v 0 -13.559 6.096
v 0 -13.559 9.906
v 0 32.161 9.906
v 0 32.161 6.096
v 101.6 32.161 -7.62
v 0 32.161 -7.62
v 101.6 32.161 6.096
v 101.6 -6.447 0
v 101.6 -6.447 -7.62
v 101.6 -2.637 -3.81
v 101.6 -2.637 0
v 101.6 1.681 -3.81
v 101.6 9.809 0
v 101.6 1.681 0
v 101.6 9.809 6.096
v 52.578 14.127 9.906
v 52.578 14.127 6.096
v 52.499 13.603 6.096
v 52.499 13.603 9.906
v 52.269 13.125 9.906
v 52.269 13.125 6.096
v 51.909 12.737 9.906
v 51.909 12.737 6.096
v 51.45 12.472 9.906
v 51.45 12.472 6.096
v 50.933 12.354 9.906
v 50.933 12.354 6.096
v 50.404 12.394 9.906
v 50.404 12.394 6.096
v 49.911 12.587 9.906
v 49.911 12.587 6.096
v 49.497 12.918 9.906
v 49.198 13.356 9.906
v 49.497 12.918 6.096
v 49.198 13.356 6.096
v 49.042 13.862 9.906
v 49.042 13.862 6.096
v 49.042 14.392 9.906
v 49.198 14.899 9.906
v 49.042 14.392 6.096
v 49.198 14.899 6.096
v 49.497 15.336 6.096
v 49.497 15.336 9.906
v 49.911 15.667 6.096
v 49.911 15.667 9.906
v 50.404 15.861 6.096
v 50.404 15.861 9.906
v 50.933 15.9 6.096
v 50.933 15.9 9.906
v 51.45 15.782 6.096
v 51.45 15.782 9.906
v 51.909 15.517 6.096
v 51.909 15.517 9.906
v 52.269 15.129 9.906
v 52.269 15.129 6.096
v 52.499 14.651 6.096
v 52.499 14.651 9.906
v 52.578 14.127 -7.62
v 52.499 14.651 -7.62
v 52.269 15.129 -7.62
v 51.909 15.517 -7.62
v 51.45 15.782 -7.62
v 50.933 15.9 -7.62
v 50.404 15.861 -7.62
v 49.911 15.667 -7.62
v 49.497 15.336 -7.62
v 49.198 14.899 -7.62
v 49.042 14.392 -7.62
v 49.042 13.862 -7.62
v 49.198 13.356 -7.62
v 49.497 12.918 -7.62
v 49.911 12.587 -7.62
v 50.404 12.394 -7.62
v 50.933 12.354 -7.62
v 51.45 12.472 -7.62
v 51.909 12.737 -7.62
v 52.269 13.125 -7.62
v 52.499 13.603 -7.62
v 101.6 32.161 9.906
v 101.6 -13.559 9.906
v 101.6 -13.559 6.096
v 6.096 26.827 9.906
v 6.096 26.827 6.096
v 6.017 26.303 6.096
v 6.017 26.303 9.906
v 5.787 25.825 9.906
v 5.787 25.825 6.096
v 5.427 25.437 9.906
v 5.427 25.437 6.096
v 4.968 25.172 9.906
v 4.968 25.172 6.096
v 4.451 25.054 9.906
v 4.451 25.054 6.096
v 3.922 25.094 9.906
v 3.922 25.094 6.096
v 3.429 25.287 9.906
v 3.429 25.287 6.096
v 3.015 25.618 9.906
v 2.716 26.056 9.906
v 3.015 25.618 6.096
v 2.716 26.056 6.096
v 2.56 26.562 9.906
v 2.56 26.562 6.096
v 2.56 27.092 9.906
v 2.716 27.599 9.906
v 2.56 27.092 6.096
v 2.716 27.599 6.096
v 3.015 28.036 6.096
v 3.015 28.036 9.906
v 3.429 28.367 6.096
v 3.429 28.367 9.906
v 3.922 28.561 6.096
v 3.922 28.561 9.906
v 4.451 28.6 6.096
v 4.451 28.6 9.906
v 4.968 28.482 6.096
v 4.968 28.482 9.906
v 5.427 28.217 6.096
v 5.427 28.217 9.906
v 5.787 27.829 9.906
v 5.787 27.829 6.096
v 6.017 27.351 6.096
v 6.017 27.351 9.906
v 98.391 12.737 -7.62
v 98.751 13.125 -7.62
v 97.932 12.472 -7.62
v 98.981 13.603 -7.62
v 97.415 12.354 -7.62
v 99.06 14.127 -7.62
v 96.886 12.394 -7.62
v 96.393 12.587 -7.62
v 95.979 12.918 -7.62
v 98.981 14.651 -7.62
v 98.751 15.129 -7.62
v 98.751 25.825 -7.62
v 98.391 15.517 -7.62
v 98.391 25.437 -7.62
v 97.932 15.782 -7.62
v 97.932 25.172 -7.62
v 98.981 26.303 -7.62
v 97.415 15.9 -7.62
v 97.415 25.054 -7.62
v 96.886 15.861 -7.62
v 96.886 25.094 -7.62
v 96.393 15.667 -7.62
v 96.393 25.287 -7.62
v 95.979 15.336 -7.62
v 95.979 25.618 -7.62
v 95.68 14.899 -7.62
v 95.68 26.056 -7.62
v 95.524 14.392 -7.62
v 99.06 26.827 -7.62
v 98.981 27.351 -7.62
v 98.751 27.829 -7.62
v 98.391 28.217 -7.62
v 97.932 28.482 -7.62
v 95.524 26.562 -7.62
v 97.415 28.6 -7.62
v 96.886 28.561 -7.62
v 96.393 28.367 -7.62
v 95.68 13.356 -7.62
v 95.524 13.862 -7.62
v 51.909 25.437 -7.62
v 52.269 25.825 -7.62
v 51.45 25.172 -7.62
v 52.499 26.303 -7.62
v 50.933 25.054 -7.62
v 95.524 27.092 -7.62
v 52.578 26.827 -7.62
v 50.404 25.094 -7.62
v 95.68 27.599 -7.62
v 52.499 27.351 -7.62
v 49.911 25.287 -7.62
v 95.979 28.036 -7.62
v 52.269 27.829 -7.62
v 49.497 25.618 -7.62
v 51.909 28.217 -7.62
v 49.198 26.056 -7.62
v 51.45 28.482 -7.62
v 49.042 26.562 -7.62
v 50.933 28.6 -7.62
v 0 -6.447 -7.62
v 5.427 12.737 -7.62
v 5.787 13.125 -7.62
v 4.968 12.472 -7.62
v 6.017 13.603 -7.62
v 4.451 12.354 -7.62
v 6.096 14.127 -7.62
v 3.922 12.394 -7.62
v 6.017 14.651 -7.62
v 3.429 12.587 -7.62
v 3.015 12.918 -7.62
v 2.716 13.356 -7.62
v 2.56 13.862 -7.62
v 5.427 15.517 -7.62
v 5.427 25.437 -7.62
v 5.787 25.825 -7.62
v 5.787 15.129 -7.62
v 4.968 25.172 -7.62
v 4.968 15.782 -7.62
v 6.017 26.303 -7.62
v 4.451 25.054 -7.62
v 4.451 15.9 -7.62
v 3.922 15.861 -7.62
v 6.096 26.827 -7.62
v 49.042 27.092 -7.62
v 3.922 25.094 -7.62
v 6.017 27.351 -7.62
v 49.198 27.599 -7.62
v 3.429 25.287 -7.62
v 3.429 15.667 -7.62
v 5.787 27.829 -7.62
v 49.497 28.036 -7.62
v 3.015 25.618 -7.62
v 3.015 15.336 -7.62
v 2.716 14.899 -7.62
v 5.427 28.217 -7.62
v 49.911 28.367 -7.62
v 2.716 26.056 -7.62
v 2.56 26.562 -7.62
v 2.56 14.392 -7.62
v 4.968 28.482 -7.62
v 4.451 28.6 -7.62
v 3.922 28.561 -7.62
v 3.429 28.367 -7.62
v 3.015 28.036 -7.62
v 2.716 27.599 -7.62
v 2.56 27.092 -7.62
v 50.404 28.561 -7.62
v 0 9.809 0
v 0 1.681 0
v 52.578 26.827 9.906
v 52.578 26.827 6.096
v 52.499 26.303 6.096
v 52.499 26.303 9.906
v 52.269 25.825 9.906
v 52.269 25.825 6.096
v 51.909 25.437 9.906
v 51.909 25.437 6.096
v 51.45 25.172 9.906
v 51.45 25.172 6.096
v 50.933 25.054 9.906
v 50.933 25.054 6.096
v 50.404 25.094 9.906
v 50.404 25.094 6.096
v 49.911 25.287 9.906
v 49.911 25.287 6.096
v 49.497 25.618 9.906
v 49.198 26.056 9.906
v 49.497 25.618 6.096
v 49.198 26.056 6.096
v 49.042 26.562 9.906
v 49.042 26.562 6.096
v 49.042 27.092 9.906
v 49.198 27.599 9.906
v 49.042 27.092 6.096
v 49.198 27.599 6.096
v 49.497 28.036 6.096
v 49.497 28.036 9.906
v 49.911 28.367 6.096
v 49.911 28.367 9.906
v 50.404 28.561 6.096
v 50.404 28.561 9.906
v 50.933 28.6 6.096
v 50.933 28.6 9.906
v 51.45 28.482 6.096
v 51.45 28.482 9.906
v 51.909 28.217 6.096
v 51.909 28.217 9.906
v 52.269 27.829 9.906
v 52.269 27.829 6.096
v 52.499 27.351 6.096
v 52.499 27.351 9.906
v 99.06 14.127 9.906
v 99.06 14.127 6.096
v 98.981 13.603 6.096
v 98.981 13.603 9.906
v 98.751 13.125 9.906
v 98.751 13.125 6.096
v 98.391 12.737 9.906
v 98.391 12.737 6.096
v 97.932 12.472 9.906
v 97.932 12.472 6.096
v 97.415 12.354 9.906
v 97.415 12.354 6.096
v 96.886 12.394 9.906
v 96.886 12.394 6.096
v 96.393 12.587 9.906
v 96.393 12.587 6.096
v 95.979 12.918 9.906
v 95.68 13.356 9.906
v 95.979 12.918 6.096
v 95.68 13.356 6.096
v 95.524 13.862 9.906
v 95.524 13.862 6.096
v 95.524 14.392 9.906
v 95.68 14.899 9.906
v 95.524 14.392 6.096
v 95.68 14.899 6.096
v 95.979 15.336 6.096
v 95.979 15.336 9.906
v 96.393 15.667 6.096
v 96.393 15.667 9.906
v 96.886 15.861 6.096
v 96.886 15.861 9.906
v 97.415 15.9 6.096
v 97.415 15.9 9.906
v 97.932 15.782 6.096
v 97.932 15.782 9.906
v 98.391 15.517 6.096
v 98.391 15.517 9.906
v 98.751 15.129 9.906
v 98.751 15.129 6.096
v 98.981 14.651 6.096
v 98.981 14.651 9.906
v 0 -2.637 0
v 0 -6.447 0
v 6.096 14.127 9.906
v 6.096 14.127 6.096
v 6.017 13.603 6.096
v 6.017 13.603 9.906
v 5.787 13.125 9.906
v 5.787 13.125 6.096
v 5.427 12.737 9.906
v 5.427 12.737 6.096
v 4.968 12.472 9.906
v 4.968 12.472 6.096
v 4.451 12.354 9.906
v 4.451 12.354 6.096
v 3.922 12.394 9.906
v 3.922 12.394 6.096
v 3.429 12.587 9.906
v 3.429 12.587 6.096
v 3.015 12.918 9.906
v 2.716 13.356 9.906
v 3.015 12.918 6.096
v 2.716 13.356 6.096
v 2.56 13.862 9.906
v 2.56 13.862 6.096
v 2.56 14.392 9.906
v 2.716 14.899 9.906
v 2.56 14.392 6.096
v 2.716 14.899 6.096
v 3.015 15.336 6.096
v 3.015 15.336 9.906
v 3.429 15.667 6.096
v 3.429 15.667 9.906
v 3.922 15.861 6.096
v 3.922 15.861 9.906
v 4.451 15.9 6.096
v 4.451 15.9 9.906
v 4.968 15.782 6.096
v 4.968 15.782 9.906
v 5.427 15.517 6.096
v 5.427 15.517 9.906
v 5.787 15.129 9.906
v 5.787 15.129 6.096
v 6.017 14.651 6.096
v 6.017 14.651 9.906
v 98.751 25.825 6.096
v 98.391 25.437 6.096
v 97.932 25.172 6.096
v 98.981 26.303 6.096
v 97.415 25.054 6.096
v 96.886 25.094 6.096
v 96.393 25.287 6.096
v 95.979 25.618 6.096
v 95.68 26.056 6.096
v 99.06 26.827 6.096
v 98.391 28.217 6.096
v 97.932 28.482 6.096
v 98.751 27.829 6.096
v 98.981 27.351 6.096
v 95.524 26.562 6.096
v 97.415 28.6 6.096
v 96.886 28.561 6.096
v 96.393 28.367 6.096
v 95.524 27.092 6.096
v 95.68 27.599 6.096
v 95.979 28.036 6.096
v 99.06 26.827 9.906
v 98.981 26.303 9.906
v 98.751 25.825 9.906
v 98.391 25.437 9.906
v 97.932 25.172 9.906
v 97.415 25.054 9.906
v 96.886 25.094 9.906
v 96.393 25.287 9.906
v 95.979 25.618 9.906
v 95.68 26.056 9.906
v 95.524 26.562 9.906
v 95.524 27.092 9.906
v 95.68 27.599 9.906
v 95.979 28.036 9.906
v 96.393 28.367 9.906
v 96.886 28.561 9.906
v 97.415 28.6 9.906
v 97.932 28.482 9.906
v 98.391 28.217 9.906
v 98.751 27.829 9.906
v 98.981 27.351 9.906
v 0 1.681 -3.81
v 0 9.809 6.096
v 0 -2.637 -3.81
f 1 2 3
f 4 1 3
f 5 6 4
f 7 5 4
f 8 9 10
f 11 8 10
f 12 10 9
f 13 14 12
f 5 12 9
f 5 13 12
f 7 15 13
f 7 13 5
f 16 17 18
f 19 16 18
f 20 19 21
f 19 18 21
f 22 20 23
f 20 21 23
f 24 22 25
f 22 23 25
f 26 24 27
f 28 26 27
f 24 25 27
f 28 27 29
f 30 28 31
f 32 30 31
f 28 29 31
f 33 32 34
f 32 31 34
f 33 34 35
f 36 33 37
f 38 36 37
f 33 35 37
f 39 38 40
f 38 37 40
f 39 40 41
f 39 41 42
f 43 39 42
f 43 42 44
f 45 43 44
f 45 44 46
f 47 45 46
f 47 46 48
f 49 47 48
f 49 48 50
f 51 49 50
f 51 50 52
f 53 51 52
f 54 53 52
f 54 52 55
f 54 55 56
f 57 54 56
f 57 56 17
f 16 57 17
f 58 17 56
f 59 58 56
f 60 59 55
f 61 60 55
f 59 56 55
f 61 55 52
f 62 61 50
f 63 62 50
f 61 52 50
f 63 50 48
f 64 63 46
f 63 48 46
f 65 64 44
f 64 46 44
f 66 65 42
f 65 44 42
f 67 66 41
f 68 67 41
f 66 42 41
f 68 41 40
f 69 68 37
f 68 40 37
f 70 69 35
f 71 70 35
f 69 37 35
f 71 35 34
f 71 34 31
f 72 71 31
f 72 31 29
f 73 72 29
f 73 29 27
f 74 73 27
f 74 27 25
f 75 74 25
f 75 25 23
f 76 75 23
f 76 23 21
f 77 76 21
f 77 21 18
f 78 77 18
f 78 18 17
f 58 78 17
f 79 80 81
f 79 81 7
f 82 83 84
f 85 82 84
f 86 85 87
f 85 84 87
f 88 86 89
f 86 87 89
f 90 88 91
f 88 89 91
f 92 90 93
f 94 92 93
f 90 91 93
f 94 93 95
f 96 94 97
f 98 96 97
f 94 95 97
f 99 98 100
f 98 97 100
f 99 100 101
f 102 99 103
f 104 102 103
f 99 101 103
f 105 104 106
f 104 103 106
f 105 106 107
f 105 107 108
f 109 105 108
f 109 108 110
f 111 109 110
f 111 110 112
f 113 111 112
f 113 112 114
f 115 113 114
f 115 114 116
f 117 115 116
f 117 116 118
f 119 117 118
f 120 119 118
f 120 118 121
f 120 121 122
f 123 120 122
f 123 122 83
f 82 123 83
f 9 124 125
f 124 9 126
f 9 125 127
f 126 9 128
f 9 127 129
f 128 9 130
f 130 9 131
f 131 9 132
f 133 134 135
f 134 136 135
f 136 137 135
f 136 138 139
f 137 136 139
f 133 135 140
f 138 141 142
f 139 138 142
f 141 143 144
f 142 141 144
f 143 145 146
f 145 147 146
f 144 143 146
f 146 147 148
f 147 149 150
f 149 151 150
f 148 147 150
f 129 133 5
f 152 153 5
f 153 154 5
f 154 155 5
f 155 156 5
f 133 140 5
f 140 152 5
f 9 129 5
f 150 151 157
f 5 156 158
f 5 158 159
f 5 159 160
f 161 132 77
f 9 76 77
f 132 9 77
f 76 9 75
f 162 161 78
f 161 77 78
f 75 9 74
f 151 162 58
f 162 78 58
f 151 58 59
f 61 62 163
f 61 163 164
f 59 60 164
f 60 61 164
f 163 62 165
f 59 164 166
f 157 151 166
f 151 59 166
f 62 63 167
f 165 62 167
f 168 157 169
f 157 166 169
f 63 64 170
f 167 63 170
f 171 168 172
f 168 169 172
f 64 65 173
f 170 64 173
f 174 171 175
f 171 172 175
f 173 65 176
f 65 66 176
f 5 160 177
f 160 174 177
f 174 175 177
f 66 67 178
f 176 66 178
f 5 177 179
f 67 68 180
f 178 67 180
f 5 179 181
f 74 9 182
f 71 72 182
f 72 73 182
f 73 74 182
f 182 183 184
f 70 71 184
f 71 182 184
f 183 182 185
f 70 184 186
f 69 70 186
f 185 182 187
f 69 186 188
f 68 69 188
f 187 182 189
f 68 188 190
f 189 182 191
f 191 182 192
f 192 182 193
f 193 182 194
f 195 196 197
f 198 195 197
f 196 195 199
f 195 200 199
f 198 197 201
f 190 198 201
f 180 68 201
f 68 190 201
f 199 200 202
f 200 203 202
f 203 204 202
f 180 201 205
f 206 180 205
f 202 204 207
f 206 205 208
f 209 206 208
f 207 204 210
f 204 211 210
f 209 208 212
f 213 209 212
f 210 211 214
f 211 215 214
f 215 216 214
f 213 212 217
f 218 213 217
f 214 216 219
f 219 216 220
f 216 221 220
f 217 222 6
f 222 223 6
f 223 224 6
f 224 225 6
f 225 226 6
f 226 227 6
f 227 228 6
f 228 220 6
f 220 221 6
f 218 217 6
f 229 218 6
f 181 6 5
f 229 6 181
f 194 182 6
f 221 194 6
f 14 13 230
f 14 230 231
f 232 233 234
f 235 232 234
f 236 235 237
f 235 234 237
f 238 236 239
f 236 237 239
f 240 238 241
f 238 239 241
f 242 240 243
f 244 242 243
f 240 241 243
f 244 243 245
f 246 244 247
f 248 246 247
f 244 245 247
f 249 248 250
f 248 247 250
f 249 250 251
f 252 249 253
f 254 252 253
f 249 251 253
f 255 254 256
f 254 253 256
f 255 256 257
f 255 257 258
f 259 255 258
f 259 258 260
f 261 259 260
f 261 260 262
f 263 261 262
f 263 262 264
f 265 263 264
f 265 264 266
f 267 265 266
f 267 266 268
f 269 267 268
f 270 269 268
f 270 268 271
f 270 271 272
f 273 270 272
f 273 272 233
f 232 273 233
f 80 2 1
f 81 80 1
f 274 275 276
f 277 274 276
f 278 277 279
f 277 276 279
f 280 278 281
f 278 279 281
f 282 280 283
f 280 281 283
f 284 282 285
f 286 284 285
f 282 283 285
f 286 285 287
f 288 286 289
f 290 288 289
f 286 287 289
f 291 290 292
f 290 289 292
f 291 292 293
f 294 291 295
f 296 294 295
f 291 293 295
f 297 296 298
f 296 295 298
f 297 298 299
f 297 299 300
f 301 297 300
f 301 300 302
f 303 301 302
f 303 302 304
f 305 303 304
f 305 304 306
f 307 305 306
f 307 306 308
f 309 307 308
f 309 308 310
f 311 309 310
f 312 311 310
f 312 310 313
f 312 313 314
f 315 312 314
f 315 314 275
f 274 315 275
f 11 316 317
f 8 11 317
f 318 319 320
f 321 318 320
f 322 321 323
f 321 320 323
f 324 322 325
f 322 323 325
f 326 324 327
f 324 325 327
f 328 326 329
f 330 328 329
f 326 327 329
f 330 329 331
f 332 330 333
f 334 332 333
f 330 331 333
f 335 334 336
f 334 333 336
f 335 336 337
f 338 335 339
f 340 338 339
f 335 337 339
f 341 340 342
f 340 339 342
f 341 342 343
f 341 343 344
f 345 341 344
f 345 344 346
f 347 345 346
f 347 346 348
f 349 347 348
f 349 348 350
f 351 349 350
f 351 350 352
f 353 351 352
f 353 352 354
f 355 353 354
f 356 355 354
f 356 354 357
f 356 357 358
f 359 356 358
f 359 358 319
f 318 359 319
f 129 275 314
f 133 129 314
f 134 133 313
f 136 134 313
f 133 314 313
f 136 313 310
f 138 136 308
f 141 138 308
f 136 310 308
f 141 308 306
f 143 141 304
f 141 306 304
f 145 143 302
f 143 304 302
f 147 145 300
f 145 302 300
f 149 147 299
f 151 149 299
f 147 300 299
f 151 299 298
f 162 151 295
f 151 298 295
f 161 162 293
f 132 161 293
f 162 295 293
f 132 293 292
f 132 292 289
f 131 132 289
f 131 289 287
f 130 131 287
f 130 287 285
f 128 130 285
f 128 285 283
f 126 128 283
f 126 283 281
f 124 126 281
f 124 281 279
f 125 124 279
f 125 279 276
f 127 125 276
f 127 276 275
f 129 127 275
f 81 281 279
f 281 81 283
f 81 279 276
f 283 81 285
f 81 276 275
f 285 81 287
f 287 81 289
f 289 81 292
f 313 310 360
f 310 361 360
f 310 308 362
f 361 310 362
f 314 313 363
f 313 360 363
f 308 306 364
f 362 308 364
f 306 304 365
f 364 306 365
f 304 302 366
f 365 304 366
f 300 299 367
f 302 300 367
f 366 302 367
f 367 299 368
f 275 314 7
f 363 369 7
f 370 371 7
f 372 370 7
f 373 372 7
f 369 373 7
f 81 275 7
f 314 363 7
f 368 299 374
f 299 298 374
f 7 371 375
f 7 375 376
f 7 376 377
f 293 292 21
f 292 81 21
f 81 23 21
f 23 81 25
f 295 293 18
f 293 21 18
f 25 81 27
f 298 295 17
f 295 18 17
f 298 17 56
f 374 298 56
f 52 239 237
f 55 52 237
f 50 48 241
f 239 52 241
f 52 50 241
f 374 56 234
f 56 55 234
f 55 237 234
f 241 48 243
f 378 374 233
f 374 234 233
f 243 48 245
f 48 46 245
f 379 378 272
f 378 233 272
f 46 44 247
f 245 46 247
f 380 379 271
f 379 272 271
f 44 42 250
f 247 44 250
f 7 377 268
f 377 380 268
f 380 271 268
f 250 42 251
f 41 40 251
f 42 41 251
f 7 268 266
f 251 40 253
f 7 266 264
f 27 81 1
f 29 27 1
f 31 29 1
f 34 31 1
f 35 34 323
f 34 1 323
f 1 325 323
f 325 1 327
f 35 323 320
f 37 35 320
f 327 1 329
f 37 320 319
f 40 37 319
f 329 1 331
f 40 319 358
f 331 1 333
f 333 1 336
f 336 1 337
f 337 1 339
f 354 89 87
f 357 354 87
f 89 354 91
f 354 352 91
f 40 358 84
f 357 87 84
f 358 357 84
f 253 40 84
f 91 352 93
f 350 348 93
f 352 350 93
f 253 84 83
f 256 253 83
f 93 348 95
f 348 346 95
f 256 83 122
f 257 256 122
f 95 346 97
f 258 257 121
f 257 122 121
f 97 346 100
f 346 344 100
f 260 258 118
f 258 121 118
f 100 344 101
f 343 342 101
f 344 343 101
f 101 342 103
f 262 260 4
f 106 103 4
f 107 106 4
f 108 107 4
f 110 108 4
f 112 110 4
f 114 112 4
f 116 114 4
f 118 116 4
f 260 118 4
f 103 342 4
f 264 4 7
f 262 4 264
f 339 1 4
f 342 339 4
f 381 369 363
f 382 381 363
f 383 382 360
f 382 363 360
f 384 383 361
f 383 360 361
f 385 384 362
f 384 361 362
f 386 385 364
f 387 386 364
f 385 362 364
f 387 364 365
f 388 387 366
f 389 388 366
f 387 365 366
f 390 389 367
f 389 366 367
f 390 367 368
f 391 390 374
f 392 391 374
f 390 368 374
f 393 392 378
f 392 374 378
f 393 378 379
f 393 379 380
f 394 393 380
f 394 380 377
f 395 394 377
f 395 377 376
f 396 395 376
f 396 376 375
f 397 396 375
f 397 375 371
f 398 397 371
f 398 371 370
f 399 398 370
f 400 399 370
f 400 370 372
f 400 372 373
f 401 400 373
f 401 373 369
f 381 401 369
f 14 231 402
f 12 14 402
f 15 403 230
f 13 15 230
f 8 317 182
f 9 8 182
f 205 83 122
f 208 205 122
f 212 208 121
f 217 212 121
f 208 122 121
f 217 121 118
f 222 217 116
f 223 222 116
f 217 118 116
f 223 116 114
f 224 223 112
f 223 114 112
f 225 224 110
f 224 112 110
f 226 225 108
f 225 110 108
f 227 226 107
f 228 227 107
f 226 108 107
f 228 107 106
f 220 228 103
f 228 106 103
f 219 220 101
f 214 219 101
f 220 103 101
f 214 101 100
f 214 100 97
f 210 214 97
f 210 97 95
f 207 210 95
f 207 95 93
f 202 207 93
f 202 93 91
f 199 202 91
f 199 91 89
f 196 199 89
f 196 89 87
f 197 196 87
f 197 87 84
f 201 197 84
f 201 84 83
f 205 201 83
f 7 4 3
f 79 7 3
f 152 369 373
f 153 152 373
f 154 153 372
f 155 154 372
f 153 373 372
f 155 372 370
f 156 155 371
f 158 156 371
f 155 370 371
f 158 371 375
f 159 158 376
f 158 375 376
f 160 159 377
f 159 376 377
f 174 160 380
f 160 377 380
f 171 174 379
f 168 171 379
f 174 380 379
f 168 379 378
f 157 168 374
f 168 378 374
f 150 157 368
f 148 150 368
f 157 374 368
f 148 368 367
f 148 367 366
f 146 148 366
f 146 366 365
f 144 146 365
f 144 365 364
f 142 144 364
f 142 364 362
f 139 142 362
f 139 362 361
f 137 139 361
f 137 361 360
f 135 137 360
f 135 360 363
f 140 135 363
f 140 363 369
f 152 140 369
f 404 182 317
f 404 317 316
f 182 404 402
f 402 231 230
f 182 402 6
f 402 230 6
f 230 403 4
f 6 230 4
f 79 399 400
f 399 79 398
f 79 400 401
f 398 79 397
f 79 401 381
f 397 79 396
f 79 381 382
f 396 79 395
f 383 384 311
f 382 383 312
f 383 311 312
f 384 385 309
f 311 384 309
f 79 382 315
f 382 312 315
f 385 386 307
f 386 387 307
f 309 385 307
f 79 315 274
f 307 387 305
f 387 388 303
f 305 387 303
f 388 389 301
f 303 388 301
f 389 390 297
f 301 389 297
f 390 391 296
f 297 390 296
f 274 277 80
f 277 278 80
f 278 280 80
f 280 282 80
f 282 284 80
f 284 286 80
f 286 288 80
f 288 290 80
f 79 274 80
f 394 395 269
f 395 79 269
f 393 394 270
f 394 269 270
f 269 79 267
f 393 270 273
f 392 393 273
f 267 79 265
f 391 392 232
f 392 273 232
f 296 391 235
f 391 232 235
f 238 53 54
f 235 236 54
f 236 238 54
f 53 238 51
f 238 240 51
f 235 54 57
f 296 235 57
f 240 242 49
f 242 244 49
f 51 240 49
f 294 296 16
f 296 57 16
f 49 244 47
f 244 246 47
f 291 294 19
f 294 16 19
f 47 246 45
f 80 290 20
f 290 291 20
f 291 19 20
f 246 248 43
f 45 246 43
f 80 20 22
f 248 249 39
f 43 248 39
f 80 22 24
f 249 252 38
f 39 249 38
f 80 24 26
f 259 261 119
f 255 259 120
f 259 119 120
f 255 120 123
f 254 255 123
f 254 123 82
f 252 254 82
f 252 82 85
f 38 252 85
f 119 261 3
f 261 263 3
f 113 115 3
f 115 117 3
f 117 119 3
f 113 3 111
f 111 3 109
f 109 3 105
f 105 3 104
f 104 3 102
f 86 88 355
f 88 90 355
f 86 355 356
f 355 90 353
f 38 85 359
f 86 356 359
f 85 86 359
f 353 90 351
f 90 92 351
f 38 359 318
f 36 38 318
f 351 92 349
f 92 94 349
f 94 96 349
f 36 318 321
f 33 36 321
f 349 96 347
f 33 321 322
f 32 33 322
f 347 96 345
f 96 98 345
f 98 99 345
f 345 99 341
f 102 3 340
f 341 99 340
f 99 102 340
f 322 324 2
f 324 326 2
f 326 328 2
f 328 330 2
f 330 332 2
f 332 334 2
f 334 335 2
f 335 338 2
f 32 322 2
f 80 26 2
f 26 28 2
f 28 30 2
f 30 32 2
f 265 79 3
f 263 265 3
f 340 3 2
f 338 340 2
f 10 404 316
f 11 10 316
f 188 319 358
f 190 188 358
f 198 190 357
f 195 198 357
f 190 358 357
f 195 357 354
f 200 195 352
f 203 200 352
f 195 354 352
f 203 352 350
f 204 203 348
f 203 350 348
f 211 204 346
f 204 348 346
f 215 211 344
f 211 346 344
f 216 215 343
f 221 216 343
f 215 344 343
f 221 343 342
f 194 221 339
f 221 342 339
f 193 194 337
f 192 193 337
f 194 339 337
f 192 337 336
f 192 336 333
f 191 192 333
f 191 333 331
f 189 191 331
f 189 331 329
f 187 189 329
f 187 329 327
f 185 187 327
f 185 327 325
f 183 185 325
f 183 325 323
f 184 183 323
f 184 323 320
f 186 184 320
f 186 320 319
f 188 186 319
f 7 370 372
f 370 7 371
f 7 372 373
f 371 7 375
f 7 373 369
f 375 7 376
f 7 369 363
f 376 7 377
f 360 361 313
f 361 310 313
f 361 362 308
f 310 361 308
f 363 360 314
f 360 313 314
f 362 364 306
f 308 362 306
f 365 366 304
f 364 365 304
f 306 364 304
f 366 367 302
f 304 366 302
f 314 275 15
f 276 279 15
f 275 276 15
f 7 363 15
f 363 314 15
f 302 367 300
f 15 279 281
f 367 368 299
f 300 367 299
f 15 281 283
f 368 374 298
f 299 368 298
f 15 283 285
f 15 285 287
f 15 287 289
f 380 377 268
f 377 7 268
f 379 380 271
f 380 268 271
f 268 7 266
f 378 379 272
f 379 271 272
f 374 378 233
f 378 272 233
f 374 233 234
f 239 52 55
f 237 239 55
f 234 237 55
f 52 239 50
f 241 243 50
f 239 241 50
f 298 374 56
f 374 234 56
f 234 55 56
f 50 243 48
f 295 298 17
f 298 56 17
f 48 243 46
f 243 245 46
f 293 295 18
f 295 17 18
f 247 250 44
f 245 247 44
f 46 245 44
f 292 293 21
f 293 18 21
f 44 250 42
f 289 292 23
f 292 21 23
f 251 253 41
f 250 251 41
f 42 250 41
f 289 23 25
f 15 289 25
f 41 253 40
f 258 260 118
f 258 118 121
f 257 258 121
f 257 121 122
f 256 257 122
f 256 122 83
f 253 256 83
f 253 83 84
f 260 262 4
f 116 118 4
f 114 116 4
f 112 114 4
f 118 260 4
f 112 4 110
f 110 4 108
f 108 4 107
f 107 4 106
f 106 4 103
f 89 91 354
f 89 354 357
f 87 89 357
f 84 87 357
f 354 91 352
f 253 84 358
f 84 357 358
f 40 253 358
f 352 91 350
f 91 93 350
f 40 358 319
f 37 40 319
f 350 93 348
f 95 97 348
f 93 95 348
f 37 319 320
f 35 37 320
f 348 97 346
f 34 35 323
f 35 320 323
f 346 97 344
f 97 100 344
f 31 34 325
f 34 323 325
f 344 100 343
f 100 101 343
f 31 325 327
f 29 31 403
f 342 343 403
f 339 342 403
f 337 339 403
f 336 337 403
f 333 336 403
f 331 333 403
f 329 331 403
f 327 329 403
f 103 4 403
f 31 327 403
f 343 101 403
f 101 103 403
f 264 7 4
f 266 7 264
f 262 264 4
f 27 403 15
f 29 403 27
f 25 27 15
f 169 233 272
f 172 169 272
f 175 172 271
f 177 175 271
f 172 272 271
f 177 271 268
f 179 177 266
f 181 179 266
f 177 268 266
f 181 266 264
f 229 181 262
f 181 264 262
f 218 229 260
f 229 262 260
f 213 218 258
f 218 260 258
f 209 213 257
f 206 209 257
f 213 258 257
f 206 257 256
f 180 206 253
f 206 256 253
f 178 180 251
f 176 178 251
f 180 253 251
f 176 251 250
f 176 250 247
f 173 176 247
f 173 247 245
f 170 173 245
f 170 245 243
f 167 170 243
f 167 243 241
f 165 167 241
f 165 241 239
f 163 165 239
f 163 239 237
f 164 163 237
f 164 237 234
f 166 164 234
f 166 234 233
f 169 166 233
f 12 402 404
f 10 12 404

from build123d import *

# Parameters (mm, degrees)
F1_DEPTH = 101.6
F2_R     = 1.778
F3_DEPTH = 13.717
F5_DEPTH = 101.6
F6_R     = 1.778
F7_DEPTH = 3.811


with BuildPart() as f1:
    # F0 (on Right) → F1 (new body)
    with BuildSketch(Plane.YZ):
        Polygon((-6.446921, 0), (-6.446921, -7.62), (32.161079, -7.62), (32.161079, 0), (32.161079, 6.096), (9.809079, 6.096), (9.809079, 0), (1.681079, 0), (1.681079, -3.81), (-2.636921, -3.81), (-2.636921, 0), align=None)
    extrude(amount=F1_DEPTH)

    # F2 (on face) → F3 (cut, through all)
    with BuildSketch(Plane.XY.offset(6.096)):
        with Locations((97.282, 14.127079)):
            Circle(F2_R)
        with Locations((97.282, 26.827079)):
            Circle(F2_R)
        with Locations((4.318, 14.127079)):
            Circle(F2_R)
        with Locations((4.318, 26.827079)):
            Circle(F2_R)
        with Locations((50.8, 14.127079)):
            Circle(F2_R)
        with Locations((50.8, 26.827079)):
            Circle(F2_R)
    extrude(amount=-F3_DEPTH, mode=Mode.SUBTRACT)


with BuildPart() as f5:
    # F4 (on Right) → F5 (new body, through all)
    with BuildSketch(Plane.YZ):
        Polygon((-13.558921, 9.906), (-13.558921, 6.096), (9.809079, 6.096), (32.161079, 6.096), (32.161079, 9.906), align=None)
    extrude(amount=F5_DEPTH)

    # F6 (on face) → F7 (cut, through all)
    with BuildSketch(Plane(origin=(0, 0, 6.096), x_dir=(1, 0, 0), z_dir=(0, 0, -1))):
        with Locations((97.282, -14.127079)):
            Circle(F6_R)
        with Locations((50.8, -14.127079)):
            Circle(F6_R)
        with Locations((4.318, -14.127079)):
            Circle(F6_R)
        with Locations((4.318, -26.827079)):
            Circle(F6_R)
        with Locations((50.8, -26.827079)):
            Circle(F6_R)
        with Locations((97.282, -26.827079)):
            Circle(F6_R)
    extrude(amount=-F7_DEPTH, mode=Mode.SUBTRACT)


solid = Compound([f1.part, f5.part])
